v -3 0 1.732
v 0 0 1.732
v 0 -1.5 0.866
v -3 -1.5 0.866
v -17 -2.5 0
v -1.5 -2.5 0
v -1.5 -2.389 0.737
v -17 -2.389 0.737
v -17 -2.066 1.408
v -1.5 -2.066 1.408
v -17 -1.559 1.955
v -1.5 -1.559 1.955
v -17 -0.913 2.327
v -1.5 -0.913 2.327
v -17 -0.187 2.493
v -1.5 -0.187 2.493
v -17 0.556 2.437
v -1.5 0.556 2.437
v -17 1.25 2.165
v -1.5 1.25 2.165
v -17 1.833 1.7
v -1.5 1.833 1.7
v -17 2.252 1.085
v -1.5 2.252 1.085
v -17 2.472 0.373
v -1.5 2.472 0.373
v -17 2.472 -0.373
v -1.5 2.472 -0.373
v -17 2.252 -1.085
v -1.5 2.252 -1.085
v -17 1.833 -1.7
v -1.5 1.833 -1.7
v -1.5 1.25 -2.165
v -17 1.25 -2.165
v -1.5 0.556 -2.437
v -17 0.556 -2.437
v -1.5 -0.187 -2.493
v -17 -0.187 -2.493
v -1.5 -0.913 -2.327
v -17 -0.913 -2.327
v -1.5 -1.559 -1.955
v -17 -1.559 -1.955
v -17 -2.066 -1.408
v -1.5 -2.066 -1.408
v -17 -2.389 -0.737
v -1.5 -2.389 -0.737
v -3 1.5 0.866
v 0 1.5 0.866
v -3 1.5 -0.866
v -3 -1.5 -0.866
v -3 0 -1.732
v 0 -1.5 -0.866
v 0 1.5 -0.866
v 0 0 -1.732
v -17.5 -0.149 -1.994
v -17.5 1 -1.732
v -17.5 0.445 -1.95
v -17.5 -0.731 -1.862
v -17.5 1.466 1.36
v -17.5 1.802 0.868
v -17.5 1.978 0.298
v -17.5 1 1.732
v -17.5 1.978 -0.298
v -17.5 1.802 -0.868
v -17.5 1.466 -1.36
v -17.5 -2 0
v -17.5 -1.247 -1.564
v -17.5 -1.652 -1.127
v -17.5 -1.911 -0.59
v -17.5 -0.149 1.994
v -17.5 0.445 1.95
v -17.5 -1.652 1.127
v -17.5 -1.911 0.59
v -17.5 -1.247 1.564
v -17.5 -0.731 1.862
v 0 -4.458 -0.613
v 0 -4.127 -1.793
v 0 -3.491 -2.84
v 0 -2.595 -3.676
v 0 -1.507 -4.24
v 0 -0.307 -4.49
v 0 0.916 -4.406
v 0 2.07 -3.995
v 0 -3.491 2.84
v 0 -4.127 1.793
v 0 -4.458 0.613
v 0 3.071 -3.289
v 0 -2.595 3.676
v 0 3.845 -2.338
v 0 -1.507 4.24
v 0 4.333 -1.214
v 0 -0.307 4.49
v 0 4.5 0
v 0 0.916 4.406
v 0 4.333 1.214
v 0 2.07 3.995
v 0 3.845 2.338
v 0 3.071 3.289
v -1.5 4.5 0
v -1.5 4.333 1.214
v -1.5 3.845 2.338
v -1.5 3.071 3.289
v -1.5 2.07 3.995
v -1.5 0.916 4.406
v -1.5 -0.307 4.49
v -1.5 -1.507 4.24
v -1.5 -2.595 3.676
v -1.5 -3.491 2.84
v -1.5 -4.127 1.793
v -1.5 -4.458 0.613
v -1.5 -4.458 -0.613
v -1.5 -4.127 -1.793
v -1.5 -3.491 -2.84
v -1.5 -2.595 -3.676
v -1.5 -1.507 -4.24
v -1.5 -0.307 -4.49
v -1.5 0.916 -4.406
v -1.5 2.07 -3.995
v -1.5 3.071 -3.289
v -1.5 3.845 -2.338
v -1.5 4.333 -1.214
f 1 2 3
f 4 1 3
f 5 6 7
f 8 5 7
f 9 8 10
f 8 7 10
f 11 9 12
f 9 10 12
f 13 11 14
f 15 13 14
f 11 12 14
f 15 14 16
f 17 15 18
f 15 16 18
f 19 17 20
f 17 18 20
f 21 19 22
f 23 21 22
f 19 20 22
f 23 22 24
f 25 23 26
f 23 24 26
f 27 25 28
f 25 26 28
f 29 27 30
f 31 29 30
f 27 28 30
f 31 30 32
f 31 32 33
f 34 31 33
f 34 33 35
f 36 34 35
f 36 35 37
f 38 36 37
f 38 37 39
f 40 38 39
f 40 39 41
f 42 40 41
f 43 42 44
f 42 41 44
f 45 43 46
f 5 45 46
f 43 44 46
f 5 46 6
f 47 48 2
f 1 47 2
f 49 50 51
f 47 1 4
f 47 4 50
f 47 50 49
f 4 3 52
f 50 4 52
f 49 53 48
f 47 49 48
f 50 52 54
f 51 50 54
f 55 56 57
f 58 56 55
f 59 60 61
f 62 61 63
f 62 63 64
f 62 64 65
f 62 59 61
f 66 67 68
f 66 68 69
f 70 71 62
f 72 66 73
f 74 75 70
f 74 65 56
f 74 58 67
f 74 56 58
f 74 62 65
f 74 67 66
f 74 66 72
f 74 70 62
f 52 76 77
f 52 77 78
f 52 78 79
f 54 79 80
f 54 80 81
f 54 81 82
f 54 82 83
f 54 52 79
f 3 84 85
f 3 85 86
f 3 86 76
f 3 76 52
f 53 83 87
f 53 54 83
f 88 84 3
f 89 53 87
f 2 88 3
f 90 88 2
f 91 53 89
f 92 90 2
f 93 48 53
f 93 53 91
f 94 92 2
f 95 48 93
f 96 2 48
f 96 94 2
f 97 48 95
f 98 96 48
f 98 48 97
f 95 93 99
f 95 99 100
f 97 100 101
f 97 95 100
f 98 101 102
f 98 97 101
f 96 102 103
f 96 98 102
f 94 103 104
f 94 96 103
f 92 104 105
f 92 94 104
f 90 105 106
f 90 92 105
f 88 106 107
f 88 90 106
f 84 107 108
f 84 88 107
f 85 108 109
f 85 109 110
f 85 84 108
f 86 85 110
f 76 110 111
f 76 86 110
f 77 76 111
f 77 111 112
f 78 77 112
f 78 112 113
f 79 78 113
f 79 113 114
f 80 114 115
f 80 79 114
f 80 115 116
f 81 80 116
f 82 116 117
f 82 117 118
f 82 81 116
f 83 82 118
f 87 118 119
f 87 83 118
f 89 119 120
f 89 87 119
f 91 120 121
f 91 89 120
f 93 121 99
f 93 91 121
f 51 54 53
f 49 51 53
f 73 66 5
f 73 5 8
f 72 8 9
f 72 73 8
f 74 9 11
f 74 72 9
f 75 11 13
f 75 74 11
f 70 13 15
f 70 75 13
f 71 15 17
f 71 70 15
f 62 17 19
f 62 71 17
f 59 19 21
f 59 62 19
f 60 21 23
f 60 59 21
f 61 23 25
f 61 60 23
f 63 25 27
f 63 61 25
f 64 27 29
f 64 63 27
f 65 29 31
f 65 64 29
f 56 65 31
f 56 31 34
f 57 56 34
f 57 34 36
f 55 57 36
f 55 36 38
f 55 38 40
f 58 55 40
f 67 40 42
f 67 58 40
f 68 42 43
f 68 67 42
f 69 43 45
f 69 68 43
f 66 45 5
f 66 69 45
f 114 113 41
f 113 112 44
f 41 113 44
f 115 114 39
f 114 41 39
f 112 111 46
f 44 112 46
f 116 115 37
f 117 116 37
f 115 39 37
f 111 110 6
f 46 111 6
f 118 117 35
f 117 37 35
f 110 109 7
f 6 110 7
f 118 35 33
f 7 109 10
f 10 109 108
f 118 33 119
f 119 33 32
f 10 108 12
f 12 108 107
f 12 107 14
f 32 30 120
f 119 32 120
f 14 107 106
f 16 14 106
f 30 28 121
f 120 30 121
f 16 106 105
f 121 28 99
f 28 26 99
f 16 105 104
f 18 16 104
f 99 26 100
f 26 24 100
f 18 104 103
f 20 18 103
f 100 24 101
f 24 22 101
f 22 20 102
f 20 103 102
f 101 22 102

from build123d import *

# Parameters (mm, degrees)
F0_R     = 4.5
F1_DEPTH = 1.5
F2_R     = 2.5
F3_DEPTH = 16
F4_SIZE  = 0.5
F6_DEPTH = 3


with BuildPart() as f1:
    # F0 (on Right) → F1 (new body)
    with BuildSketch(Plane.YZ):
        Circle(F0_R)
    extrude(amount=-F1_DEPTH)

    # F2 (on face) → F3 (join)
    with BuildSketch(Plane(origin=(-1.5, 0, 0), x_dir=(0, -1, 0), z_dir=(-1, 0, 0))):
        Circle(F2_R)
    extrude(amount=F3_DEPTH)

    # F4
    f4_edges = [f1.edges().sort_by_distance(p)[0] for p in [
        (-17.5, 2.5, 0),
    ]]
    chamfer(f4_edges, length=F4_SIZE)

    # F5 (on face) → F6 (cut)
    with BuildSketch(Plane.YZ):
        Polygon((0, -1.732051), (1.5, -0.866025), (1.5, 0.866025), (0, 1.732051), (-1.5, 0.866025), (-1.5, -0.866025), align=None)
    extrude(amount=-F6_DEPTH, mode=Mode.SUBTRACT)


solid = f1.part
